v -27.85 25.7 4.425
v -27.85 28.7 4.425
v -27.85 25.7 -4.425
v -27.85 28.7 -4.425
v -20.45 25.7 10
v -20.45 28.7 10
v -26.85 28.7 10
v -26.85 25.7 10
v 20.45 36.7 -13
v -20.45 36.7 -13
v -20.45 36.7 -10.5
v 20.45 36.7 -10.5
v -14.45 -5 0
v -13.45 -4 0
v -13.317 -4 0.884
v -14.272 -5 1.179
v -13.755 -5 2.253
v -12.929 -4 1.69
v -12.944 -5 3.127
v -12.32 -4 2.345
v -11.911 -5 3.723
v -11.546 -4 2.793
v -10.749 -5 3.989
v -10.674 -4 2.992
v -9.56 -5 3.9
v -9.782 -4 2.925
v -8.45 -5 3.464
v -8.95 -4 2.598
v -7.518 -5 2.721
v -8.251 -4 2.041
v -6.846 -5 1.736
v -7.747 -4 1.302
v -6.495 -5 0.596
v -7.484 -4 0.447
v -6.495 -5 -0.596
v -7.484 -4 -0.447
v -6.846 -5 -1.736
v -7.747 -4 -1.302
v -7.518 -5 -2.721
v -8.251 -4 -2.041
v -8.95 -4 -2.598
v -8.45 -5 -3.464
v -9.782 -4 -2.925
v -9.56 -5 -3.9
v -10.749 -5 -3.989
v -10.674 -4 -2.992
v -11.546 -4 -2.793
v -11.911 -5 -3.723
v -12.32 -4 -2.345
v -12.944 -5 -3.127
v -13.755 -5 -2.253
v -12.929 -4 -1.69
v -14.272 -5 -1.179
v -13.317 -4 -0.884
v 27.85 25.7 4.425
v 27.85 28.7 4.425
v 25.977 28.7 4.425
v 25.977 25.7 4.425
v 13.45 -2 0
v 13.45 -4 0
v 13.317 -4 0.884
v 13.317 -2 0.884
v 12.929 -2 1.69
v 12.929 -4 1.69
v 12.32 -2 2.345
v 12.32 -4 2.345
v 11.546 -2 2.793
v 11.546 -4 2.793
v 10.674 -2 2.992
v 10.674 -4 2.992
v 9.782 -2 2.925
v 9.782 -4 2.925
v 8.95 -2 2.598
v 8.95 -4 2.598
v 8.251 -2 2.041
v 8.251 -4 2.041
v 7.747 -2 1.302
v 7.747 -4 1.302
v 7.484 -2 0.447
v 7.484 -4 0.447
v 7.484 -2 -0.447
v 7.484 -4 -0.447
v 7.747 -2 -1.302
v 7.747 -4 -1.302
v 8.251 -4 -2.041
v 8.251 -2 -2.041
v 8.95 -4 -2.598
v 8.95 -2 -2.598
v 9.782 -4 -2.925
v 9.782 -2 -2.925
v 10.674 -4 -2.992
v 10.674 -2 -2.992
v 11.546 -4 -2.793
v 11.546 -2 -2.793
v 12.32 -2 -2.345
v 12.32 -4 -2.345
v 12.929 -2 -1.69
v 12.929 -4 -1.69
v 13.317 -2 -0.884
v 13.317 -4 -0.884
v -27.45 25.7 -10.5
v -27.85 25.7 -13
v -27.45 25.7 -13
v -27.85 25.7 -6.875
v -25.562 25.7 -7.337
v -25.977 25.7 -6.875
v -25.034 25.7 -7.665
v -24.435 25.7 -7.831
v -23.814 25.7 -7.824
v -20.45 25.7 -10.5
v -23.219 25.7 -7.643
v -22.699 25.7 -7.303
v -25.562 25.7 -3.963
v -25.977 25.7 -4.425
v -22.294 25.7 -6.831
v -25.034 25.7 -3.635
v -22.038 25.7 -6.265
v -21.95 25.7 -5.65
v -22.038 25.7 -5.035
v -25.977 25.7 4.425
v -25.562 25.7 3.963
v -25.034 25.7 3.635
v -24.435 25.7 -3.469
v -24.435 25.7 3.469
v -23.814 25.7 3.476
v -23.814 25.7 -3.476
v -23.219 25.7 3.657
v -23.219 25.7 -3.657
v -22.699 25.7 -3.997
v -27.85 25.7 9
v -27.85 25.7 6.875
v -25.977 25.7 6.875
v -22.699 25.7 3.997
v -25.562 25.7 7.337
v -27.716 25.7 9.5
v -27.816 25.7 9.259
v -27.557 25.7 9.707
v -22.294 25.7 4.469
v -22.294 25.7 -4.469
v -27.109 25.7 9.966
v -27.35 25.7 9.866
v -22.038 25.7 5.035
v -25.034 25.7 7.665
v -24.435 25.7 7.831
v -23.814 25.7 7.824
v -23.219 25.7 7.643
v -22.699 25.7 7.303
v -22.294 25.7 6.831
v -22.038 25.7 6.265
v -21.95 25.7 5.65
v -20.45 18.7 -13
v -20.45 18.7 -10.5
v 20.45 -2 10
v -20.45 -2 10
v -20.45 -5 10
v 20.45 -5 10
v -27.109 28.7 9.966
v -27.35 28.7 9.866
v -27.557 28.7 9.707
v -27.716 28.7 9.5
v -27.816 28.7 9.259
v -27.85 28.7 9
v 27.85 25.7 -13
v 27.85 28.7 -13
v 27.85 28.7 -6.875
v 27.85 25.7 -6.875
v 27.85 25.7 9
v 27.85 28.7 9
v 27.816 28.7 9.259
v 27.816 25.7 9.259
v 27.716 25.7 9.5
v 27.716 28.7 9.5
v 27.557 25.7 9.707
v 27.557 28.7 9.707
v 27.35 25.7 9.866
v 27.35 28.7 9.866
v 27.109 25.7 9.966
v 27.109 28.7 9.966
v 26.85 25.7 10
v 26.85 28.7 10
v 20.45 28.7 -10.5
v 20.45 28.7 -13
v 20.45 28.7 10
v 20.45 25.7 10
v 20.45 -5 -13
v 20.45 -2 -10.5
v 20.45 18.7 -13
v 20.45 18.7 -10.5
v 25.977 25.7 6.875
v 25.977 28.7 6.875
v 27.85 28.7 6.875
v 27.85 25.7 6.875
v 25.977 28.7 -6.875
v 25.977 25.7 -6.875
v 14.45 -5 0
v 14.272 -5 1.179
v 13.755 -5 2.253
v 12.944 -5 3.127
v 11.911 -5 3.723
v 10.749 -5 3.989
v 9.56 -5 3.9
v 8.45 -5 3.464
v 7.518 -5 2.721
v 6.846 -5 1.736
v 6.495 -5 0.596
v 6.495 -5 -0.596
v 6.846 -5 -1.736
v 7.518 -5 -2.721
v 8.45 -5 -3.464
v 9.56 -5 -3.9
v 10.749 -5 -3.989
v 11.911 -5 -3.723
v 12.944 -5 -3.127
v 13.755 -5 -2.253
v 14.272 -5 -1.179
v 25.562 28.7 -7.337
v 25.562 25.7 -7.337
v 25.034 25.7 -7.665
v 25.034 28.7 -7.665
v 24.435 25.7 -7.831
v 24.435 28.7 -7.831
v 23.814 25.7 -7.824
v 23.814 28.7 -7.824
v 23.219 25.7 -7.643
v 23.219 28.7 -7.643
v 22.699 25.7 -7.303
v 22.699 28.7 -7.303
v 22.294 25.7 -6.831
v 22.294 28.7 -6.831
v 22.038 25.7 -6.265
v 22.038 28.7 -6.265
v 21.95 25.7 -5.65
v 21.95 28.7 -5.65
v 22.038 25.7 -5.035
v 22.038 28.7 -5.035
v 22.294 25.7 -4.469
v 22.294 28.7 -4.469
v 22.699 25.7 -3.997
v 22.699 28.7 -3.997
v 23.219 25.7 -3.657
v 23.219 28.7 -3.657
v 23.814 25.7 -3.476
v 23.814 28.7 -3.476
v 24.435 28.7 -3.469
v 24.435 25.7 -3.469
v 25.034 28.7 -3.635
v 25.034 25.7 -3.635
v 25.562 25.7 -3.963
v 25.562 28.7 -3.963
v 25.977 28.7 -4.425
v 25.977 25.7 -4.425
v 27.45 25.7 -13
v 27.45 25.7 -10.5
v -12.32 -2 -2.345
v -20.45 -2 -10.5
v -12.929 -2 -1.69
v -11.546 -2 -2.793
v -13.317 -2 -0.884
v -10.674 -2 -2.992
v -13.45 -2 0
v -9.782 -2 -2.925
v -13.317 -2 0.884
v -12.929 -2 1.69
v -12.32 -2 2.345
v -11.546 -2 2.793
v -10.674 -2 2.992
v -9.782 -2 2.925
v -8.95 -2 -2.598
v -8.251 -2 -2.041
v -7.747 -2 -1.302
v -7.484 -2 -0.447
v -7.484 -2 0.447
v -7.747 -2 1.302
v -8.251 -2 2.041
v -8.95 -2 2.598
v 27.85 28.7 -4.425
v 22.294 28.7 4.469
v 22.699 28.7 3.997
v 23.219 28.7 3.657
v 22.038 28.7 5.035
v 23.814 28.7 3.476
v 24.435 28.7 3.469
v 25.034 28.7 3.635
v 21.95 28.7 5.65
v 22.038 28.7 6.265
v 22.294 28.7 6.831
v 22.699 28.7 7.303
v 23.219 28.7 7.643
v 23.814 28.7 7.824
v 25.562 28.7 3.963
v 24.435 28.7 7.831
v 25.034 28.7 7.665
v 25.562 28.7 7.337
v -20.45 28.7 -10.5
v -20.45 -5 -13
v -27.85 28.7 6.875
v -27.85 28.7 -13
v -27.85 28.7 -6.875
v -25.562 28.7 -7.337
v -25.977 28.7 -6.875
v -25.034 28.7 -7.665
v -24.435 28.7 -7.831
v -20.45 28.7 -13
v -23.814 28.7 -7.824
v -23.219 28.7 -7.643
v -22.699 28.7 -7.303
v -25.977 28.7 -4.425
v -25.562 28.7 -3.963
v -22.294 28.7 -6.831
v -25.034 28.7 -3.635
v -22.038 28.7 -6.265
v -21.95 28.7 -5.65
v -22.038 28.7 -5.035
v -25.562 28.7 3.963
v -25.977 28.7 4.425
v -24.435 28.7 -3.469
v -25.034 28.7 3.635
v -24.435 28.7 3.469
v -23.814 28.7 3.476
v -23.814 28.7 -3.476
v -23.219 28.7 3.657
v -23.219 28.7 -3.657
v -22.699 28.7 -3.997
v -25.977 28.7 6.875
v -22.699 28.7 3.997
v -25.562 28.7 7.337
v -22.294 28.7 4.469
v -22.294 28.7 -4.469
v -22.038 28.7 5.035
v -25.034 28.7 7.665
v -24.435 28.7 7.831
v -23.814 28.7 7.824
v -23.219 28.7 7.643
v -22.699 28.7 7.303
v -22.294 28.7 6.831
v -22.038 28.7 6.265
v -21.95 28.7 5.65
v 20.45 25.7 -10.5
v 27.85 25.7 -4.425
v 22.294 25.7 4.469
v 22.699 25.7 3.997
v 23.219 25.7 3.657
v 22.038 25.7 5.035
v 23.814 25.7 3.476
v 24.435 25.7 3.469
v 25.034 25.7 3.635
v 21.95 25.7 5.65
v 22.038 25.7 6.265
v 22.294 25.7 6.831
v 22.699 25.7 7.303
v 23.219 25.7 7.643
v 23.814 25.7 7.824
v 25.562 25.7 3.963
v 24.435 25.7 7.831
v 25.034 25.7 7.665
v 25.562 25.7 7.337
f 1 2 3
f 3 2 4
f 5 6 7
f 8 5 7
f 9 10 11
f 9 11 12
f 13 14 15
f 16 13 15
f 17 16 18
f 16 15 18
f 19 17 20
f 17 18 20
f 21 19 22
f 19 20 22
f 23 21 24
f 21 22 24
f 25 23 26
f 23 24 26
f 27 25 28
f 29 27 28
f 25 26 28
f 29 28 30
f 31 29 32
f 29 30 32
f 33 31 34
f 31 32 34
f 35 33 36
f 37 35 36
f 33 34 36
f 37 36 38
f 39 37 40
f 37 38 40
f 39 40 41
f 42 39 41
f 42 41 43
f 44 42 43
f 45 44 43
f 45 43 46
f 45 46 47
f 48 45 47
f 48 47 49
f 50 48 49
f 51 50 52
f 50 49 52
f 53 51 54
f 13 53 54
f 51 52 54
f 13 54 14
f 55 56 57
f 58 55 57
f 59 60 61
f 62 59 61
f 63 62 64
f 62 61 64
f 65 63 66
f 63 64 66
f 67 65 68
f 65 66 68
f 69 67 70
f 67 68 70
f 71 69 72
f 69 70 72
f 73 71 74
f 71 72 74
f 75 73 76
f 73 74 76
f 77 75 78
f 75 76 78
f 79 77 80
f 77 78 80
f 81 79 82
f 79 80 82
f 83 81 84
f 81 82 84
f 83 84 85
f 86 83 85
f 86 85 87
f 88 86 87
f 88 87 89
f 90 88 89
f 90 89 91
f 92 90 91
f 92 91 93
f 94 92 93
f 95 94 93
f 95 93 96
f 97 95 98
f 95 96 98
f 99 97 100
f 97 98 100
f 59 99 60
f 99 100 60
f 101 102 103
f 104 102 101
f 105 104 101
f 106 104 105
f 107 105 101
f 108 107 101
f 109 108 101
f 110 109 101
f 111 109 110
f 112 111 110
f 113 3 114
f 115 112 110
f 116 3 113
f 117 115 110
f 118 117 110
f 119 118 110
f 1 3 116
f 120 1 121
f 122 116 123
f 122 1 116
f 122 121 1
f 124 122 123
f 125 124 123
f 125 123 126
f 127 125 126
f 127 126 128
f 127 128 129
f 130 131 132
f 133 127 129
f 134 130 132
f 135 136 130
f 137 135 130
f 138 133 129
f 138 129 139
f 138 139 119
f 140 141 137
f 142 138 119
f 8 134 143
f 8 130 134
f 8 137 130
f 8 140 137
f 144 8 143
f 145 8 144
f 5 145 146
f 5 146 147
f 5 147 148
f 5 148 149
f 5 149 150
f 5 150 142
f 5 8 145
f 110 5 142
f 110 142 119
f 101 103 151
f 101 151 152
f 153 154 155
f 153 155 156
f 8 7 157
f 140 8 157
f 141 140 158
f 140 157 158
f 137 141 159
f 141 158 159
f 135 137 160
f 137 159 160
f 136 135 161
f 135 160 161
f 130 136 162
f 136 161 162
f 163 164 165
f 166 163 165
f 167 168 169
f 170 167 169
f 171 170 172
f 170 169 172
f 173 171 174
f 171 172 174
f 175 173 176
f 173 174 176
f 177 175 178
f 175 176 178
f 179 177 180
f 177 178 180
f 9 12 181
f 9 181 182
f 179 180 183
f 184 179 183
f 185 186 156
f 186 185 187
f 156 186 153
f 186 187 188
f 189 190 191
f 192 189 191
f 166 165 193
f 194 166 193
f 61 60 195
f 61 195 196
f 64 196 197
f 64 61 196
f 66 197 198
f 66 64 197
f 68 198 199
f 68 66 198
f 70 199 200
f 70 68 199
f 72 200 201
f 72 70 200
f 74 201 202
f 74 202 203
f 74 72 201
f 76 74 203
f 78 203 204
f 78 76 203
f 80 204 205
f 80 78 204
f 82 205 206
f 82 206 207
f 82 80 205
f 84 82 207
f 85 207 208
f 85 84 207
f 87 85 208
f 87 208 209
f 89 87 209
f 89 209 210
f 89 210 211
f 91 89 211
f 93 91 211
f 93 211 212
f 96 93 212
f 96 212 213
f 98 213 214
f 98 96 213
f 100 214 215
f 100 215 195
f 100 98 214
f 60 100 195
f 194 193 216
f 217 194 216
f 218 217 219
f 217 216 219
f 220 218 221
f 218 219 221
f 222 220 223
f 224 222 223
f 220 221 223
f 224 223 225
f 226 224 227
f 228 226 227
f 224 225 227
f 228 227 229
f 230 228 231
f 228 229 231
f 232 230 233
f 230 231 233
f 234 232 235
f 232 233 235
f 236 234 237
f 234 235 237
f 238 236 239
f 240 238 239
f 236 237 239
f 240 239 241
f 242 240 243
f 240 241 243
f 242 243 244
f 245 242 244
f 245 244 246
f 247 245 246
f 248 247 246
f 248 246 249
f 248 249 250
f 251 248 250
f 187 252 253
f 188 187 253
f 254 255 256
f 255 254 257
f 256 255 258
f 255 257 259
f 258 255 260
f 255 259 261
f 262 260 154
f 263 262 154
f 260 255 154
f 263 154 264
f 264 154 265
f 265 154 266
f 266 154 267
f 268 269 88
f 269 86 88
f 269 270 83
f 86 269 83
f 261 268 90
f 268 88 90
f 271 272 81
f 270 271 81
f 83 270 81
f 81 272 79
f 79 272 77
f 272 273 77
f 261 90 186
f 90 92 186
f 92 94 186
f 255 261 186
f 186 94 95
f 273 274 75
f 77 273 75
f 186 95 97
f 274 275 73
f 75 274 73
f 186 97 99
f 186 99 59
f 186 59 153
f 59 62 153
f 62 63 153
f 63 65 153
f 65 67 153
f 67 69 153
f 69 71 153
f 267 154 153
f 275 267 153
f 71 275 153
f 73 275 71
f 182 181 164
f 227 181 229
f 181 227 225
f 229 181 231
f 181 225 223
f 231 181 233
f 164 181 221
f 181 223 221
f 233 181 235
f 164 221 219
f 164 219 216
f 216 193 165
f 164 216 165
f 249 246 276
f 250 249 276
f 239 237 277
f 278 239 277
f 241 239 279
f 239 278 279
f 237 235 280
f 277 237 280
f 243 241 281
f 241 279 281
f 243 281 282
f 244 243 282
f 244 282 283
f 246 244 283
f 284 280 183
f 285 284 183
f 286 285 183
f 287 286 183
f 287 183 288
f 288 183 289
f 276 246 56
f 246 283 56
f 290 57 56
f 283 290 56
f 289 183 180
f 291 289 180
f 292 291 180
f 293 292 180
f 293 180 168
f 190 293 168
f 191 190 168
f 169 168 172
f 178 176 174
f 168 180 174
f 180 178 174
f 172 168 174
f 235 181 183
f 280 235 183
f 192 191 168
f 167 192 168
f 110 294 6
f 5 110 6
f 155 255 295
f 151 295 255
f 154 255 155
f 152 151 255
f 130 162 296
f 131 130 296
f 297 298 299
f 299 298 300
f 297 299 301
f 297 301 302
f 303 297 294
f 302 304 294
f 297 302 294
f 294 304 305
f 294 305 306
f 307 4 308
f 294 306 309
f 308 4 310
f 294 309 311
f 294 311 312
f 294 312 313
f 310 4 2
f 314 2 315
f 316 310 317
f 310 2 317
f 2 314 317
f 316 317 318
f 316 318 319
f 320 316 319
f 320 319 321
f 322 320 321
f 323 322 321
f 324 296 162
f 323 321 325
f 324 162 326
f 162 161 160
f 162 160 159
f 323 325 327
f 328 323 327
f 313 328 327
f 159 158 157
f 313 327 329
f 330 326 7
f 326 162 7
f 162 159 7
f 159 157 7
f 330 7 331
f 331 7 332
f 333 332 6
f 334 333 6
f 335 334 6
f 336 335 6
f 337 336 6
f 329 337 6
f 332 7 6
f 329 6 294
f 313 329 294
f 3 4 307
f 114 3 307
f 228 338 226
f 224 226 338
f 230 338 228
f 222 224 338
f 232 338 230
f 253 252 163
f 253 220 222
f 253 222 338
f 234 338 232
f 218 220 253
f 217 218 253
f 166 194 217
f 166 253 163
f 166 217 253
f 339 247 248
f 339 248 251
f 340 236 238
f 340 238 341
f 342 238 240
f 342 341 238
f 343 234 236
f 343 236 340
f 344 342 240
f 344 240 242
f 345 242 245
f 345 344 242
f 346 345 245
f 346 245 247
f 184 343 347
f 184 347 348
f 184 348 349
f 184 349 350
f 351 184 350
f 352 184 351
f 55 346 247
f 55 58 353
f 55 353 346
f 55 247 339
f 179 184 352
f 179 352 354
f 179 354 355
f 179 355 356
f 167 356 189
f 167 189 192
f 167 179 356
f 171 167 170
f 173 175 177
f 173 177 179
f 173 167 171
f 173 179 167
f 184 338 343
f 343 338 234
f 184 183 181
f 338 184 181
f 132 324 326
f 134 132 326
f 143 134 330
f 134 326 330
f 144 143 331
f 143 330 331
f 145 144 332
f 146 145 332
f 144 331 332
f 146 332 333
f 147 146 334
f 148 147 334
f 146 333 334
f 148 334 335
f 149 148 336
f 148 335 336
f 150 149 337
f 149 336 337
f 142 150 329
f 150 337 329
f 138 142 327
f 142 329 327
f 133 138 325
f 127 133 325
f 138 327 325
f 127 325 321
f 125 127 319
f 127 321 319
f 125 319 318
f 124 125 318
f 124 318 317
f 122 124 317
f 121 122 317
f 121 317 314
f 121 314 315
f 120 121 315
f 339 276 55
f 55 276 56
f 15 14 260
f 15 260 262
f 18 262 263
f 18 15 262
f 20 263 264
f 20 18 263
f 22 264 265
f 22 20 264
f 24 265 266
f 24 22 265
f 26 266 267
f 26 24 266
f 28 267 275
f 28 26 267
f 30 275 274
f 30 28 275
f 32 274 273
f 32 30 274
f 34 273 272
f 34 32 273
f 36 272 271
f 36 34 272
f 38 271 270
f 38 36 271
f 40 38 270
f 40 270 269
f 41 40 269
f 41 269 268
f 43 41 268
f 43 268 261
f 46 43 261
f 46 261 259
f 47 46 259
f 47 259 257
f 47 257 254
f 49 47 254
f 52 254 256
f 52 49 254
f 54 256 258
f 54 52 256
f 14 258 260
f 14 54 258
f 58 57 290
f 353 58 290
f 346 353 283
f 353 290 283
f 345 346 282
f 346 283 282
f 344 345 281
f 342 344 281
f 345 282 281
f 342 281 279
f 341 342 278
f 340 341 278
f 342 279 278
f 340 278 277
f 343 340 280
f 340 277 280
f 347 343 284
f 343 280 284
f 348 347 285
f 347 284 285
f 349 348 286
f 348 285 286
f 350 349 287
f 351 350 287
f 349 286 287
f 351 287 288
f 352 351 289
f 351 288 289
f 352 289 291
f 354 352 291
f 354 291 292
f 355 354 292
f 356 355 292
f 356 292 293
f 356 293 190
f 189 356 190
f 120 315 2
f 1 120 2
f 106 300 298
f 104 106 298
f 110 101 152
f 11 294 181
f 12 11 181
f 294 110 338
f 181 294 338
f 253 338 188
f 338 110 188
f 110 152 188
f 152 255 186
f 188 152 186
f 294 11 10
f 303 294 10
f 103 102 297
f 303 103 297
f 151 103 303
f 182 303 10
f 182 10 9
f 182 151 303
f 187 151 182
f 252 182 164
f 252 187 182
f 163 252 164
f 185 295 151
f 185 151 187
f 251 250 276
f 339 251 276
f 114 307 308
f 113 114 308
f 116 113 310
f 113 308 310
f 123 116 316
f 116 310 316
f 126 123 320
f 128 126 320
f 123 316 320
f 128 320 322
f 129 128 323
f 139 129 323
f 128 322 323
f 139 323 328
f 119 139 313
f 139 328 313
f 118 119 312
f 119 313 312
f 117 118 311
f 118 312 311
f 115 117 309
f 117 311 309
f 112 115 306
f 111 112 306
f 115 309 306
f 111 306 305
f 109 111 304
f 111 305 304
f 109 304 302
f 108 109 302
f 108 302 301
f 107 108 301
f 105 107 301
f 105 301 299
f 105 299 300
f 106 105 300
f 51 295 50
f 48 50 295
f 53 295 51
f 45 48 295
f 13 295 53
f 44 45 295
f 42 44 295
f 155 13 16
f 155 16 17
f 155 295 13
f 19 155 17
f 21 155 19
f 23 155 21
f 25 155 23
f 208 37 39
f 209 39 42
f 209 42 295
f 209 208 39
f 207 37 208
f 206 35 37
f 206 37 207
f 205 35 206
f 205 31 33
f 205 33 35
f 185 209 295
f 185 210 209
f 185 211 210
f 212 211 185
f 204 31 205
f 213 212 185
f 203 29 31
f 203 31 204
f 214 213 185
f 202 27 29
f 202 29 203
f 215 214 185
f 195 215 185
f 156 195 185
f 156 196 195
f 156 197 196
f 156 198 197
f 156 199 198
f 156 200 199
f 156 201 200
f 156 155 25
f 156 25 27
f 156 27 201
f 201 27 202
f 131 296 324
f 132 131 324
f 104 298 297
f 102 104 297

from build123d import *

# Parameters (mm, degrees)
EXTRUDE_2_DEPTH            = 3
SKETCH_4_W                 = 40.9
SKETCH_4_H                 = 2.5
EXTRUDE_3_DEPTH            = 27.7
SKETCH_5_W                 = 40.9
SKETCH_5_H                 = 23
EXTRUDE_4_DEPTH            = 3
CHAMFER_2_SIZE             = 7
SKETCH_8_R                 = 3
CUT_EXTRUDE_3_DEPTH        = 3
CHAMFER_3_SIZE             = 1
CHAMFER_3_OF_MIRROR_1_SIZE = 1
SKETCH_9_W                 = 40.9
SKETCH_9_H                 = 2.5
EXTRUDE_5_DEPTH            = 8


with BuildPart() as part:
    # 스케치3 → 보스-돌출2 (new body)
    with BuildSketch(Plane.XZ.offset(-28.7)):
        with BuildLine():
            Line((-27.85, -6.875), (-27.85, -9))
            Line((-27.85, -9), (-27.85, -13))
            Line((-27.85, -13), (27.85, -13))
            Line((27.85, -13), (27.85, -9))
            Line((27.85, -9), (27.85, -6.875))
            Line((27.85, -6.875), (25.977395688, -6.875))
            ThreePointArc((25.977395688, -6.875), (21.95, -5.65), (25.977395688, -4.425))
            Line((25.977395688, -4.425), (27.85, -4.425))
            Line((27.85, -4.425), (27.85, 4.425))
            Line((27.85, 4.425), (25.977395688, 4.425))
            ThreePointArc((25.977395688, 4.425), (21.95, 5.65), (25.977395688, 6.875))
            Line((25.977395688, 6.875), (27.85, 6.875))
            Line((27.85, 6.875), (27.85, 9))
            ThreePointArc((27.85, 9), (27.557106781, 9.707106781), (26.85, 10))
            Line((26.85, 10), (20.45, 10))
            Line((20.45, 10), (20.45, -10))
            Line((20.45, -10), (20.45, -10.5))
            Line((20.45, -10.5), (-20.45, -10.5))
            Line((-20.45, -10.5), (-20.45, -10))
            Line((-20.45, -10), (-20.45, 10))
            Line((-20.45, 10), (-26.85, 10))
            ThreePointArc((-26.85, 10), (-27.557106781, 9.707106781), (-27.85, 9))
            Line((-27.85, 9), (-27.85, 6.875))
            Line((-27.85, 6.875), (-25.977395688, 6.875))
            ThreePointArc((-25.977395688, 6.875), (-21.95, 5.65), (-25.977395688, 4.425))
            Line((-25.977395688, 4.425), (-27.85, 4.425))
            Line((-27.85, 4.425), (-27.85, -4.425))
            Line((-27.85, -4.425), (-25.977395688, -4.425))
            ThreePointArc((-25.977395688, -4.425), (-21.95, -5.65), (-25.977395688, -6.875))
            Line((-25.977395688, -6.875), (-27.85, -6.875))
        make_face()
    extrude(amount=EXTRUDE_2_DEPTH)

    # 스케치4 → 보스-돌출3 (add)
    with BuildSketch(Plane.XZ.offset(-25.7)):
        with Locations((0, -11.75)):
            Rectangle(SKETCH_4_W, SKETCH_4_H)
    extrude(amount=EXTRUDE_3_DEPTH)

    # 스케치5 → 보스-돌출4 (add)
    with BuildSketch(Plane.XZ.offset(2)):
        with Locations((0, -1.5)):
            Rectangle(SKETCH_5_W, SKETCH_5_H)
    extrude(amount=EXTRUDE_4_DEPTH)

    # 모따기2
    chamfer_2_edges = [part.edges().sort_by_distance(p)[0] for p in [
        (20.45, 25.7, -11.75),
        (-20.45, 25.7, -11.75),
    ]]
    chamfer(chamfer_2_edges, length=CHAMFER_2_SIZE)

    # 스케치8 → 컷-돌출3 (cut)
    with BuildSketch(Plane.XZ.offset(5)):
        with Locations((10.45, 0)):
            Circle(SKETCH_8_R)
    cut_extrude_3 = extrude(amount=-CUT_EXTRUDE_3_DEPTH, mode=Mode.SUBTRACT)

    # 모따기3
    chamfer_3_edges = [part.edges().sort_by_distance(p)[0] for p in [
        (7.45, -5, 0),
    ]]
    chamfer(chamfer_3_edges, length=CHAMFER_3_SIZE)

    # 대칭 복사1: 컷-돌출3 across plane
    add(cut_extrude_3.mirror(Plane(origin=(0, 0, 0), x_dir=(0, 0, 1), z_dir=(1, 0, 0))), mode=Mode.SUBTRACT)

    # 모따기3 of 대칭 복사1
    chamfer_3_of_mirror_1_edges = [part.edges().sort_by_distance(p)[0] for p in [
        (-7.45, -5, 0),
    ]]
    chamfer(chamfer_3_of_mirror_1_edges, length=CHAMFER_3_OF_MIRROR_1_SIZE)

    # 스케치9 → 보스-돌출5 (add)
    with BuildSketch(Plane(origin=(0, 28.7, 0), x_dir=(1, 0, 0), z_dir=(0, 1, 0))):
        with Locations((0, 11.75)):
            Rectangle(SKETCH_9_W, SKETCH_9_H)
    extrude(amount=EXTRUDE_5_DEPTH)


solid = part.part
